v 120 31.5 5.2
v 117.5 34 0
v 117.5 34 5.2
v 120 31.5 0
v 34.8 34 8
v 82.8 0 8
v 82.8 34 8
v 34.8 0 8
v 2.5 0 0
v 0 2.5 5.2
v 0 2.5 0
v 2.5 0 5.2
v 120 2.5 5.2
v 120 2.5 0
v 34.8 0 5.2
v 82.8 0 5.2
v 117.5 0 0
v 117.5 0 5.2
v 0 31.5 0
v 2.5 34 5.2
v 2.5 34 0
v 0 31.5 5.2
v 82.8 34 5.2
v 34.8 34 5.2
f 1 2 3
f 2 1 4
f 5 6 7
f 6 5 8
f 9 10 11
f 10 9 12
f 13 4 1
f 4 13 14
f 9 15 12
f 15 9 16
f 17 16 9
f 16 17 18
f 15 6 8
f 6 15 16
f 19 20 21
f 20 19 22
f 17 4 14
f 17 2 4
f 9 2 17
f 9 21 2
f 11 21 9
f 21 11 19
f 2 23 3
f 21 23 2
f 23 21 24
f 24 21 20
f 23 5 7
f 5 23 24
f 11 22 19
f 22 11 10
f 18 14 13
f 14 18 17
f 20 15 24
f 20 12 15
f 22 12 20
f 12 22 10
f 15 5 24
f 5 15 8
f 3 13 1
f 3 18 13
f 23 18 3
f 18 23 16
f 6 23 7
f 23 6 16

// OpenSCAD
$fn = 32;

// ----------------------------------------------------------------------
// Stepped bar: centerstep, 120 x 34 x 8/5.2 mm
// ----------------------------------------------------------------------

// --- parameters (mm) ---
bar_l = 120;              // bar length, X
bar_w = 34;               // bar width, Y
plate_t = 8;              // thickness of the thick zone, Z
thin_t = 5.2;             // thickness of the thin zone
corner_c = 2.5;           // corner chamfer of the bar
step_cut = 2.8;           // material removed from the thin zone
thick_from = 34.8;        // start of the thick middle zone
thick_to = 82.8;          // end of the thick middle zone
depth_1 = 2.8;            // depth of cut 1 from the top face
depth_2 = 2.8;            // depth of cut 2 from the top face

profile = [[2.5, 0], [117.5, 0], [120, 2.5], [120, 31.5], [117.5, 34], [2.5, 34], [0, 31.5], [0, 2.5]];  // primary outline, 8 points, counter clockwise
void_1 = [[-1, -1], [34.8, -1], [34.8, 35], [-1, 35]];  // thin left end, 4 points
void_2 = [[82.8, -1], [121, -1], [121, 35], [82.8, 35]];  // thin right end, 4 points

// --- the one profile operation ---
difference() {
  linear_extrude(height = plate_t) polygon(points = profile);
  translate([0, 0, plate_t - depth_1])
    linear_extrude(height = depth_1 + 1) polygon(points = void_1);
  translate([0, 0, plate_t - depth_2])
    linear_extrude(height = depth_2 + 1) polygon(points = void_2);
}
